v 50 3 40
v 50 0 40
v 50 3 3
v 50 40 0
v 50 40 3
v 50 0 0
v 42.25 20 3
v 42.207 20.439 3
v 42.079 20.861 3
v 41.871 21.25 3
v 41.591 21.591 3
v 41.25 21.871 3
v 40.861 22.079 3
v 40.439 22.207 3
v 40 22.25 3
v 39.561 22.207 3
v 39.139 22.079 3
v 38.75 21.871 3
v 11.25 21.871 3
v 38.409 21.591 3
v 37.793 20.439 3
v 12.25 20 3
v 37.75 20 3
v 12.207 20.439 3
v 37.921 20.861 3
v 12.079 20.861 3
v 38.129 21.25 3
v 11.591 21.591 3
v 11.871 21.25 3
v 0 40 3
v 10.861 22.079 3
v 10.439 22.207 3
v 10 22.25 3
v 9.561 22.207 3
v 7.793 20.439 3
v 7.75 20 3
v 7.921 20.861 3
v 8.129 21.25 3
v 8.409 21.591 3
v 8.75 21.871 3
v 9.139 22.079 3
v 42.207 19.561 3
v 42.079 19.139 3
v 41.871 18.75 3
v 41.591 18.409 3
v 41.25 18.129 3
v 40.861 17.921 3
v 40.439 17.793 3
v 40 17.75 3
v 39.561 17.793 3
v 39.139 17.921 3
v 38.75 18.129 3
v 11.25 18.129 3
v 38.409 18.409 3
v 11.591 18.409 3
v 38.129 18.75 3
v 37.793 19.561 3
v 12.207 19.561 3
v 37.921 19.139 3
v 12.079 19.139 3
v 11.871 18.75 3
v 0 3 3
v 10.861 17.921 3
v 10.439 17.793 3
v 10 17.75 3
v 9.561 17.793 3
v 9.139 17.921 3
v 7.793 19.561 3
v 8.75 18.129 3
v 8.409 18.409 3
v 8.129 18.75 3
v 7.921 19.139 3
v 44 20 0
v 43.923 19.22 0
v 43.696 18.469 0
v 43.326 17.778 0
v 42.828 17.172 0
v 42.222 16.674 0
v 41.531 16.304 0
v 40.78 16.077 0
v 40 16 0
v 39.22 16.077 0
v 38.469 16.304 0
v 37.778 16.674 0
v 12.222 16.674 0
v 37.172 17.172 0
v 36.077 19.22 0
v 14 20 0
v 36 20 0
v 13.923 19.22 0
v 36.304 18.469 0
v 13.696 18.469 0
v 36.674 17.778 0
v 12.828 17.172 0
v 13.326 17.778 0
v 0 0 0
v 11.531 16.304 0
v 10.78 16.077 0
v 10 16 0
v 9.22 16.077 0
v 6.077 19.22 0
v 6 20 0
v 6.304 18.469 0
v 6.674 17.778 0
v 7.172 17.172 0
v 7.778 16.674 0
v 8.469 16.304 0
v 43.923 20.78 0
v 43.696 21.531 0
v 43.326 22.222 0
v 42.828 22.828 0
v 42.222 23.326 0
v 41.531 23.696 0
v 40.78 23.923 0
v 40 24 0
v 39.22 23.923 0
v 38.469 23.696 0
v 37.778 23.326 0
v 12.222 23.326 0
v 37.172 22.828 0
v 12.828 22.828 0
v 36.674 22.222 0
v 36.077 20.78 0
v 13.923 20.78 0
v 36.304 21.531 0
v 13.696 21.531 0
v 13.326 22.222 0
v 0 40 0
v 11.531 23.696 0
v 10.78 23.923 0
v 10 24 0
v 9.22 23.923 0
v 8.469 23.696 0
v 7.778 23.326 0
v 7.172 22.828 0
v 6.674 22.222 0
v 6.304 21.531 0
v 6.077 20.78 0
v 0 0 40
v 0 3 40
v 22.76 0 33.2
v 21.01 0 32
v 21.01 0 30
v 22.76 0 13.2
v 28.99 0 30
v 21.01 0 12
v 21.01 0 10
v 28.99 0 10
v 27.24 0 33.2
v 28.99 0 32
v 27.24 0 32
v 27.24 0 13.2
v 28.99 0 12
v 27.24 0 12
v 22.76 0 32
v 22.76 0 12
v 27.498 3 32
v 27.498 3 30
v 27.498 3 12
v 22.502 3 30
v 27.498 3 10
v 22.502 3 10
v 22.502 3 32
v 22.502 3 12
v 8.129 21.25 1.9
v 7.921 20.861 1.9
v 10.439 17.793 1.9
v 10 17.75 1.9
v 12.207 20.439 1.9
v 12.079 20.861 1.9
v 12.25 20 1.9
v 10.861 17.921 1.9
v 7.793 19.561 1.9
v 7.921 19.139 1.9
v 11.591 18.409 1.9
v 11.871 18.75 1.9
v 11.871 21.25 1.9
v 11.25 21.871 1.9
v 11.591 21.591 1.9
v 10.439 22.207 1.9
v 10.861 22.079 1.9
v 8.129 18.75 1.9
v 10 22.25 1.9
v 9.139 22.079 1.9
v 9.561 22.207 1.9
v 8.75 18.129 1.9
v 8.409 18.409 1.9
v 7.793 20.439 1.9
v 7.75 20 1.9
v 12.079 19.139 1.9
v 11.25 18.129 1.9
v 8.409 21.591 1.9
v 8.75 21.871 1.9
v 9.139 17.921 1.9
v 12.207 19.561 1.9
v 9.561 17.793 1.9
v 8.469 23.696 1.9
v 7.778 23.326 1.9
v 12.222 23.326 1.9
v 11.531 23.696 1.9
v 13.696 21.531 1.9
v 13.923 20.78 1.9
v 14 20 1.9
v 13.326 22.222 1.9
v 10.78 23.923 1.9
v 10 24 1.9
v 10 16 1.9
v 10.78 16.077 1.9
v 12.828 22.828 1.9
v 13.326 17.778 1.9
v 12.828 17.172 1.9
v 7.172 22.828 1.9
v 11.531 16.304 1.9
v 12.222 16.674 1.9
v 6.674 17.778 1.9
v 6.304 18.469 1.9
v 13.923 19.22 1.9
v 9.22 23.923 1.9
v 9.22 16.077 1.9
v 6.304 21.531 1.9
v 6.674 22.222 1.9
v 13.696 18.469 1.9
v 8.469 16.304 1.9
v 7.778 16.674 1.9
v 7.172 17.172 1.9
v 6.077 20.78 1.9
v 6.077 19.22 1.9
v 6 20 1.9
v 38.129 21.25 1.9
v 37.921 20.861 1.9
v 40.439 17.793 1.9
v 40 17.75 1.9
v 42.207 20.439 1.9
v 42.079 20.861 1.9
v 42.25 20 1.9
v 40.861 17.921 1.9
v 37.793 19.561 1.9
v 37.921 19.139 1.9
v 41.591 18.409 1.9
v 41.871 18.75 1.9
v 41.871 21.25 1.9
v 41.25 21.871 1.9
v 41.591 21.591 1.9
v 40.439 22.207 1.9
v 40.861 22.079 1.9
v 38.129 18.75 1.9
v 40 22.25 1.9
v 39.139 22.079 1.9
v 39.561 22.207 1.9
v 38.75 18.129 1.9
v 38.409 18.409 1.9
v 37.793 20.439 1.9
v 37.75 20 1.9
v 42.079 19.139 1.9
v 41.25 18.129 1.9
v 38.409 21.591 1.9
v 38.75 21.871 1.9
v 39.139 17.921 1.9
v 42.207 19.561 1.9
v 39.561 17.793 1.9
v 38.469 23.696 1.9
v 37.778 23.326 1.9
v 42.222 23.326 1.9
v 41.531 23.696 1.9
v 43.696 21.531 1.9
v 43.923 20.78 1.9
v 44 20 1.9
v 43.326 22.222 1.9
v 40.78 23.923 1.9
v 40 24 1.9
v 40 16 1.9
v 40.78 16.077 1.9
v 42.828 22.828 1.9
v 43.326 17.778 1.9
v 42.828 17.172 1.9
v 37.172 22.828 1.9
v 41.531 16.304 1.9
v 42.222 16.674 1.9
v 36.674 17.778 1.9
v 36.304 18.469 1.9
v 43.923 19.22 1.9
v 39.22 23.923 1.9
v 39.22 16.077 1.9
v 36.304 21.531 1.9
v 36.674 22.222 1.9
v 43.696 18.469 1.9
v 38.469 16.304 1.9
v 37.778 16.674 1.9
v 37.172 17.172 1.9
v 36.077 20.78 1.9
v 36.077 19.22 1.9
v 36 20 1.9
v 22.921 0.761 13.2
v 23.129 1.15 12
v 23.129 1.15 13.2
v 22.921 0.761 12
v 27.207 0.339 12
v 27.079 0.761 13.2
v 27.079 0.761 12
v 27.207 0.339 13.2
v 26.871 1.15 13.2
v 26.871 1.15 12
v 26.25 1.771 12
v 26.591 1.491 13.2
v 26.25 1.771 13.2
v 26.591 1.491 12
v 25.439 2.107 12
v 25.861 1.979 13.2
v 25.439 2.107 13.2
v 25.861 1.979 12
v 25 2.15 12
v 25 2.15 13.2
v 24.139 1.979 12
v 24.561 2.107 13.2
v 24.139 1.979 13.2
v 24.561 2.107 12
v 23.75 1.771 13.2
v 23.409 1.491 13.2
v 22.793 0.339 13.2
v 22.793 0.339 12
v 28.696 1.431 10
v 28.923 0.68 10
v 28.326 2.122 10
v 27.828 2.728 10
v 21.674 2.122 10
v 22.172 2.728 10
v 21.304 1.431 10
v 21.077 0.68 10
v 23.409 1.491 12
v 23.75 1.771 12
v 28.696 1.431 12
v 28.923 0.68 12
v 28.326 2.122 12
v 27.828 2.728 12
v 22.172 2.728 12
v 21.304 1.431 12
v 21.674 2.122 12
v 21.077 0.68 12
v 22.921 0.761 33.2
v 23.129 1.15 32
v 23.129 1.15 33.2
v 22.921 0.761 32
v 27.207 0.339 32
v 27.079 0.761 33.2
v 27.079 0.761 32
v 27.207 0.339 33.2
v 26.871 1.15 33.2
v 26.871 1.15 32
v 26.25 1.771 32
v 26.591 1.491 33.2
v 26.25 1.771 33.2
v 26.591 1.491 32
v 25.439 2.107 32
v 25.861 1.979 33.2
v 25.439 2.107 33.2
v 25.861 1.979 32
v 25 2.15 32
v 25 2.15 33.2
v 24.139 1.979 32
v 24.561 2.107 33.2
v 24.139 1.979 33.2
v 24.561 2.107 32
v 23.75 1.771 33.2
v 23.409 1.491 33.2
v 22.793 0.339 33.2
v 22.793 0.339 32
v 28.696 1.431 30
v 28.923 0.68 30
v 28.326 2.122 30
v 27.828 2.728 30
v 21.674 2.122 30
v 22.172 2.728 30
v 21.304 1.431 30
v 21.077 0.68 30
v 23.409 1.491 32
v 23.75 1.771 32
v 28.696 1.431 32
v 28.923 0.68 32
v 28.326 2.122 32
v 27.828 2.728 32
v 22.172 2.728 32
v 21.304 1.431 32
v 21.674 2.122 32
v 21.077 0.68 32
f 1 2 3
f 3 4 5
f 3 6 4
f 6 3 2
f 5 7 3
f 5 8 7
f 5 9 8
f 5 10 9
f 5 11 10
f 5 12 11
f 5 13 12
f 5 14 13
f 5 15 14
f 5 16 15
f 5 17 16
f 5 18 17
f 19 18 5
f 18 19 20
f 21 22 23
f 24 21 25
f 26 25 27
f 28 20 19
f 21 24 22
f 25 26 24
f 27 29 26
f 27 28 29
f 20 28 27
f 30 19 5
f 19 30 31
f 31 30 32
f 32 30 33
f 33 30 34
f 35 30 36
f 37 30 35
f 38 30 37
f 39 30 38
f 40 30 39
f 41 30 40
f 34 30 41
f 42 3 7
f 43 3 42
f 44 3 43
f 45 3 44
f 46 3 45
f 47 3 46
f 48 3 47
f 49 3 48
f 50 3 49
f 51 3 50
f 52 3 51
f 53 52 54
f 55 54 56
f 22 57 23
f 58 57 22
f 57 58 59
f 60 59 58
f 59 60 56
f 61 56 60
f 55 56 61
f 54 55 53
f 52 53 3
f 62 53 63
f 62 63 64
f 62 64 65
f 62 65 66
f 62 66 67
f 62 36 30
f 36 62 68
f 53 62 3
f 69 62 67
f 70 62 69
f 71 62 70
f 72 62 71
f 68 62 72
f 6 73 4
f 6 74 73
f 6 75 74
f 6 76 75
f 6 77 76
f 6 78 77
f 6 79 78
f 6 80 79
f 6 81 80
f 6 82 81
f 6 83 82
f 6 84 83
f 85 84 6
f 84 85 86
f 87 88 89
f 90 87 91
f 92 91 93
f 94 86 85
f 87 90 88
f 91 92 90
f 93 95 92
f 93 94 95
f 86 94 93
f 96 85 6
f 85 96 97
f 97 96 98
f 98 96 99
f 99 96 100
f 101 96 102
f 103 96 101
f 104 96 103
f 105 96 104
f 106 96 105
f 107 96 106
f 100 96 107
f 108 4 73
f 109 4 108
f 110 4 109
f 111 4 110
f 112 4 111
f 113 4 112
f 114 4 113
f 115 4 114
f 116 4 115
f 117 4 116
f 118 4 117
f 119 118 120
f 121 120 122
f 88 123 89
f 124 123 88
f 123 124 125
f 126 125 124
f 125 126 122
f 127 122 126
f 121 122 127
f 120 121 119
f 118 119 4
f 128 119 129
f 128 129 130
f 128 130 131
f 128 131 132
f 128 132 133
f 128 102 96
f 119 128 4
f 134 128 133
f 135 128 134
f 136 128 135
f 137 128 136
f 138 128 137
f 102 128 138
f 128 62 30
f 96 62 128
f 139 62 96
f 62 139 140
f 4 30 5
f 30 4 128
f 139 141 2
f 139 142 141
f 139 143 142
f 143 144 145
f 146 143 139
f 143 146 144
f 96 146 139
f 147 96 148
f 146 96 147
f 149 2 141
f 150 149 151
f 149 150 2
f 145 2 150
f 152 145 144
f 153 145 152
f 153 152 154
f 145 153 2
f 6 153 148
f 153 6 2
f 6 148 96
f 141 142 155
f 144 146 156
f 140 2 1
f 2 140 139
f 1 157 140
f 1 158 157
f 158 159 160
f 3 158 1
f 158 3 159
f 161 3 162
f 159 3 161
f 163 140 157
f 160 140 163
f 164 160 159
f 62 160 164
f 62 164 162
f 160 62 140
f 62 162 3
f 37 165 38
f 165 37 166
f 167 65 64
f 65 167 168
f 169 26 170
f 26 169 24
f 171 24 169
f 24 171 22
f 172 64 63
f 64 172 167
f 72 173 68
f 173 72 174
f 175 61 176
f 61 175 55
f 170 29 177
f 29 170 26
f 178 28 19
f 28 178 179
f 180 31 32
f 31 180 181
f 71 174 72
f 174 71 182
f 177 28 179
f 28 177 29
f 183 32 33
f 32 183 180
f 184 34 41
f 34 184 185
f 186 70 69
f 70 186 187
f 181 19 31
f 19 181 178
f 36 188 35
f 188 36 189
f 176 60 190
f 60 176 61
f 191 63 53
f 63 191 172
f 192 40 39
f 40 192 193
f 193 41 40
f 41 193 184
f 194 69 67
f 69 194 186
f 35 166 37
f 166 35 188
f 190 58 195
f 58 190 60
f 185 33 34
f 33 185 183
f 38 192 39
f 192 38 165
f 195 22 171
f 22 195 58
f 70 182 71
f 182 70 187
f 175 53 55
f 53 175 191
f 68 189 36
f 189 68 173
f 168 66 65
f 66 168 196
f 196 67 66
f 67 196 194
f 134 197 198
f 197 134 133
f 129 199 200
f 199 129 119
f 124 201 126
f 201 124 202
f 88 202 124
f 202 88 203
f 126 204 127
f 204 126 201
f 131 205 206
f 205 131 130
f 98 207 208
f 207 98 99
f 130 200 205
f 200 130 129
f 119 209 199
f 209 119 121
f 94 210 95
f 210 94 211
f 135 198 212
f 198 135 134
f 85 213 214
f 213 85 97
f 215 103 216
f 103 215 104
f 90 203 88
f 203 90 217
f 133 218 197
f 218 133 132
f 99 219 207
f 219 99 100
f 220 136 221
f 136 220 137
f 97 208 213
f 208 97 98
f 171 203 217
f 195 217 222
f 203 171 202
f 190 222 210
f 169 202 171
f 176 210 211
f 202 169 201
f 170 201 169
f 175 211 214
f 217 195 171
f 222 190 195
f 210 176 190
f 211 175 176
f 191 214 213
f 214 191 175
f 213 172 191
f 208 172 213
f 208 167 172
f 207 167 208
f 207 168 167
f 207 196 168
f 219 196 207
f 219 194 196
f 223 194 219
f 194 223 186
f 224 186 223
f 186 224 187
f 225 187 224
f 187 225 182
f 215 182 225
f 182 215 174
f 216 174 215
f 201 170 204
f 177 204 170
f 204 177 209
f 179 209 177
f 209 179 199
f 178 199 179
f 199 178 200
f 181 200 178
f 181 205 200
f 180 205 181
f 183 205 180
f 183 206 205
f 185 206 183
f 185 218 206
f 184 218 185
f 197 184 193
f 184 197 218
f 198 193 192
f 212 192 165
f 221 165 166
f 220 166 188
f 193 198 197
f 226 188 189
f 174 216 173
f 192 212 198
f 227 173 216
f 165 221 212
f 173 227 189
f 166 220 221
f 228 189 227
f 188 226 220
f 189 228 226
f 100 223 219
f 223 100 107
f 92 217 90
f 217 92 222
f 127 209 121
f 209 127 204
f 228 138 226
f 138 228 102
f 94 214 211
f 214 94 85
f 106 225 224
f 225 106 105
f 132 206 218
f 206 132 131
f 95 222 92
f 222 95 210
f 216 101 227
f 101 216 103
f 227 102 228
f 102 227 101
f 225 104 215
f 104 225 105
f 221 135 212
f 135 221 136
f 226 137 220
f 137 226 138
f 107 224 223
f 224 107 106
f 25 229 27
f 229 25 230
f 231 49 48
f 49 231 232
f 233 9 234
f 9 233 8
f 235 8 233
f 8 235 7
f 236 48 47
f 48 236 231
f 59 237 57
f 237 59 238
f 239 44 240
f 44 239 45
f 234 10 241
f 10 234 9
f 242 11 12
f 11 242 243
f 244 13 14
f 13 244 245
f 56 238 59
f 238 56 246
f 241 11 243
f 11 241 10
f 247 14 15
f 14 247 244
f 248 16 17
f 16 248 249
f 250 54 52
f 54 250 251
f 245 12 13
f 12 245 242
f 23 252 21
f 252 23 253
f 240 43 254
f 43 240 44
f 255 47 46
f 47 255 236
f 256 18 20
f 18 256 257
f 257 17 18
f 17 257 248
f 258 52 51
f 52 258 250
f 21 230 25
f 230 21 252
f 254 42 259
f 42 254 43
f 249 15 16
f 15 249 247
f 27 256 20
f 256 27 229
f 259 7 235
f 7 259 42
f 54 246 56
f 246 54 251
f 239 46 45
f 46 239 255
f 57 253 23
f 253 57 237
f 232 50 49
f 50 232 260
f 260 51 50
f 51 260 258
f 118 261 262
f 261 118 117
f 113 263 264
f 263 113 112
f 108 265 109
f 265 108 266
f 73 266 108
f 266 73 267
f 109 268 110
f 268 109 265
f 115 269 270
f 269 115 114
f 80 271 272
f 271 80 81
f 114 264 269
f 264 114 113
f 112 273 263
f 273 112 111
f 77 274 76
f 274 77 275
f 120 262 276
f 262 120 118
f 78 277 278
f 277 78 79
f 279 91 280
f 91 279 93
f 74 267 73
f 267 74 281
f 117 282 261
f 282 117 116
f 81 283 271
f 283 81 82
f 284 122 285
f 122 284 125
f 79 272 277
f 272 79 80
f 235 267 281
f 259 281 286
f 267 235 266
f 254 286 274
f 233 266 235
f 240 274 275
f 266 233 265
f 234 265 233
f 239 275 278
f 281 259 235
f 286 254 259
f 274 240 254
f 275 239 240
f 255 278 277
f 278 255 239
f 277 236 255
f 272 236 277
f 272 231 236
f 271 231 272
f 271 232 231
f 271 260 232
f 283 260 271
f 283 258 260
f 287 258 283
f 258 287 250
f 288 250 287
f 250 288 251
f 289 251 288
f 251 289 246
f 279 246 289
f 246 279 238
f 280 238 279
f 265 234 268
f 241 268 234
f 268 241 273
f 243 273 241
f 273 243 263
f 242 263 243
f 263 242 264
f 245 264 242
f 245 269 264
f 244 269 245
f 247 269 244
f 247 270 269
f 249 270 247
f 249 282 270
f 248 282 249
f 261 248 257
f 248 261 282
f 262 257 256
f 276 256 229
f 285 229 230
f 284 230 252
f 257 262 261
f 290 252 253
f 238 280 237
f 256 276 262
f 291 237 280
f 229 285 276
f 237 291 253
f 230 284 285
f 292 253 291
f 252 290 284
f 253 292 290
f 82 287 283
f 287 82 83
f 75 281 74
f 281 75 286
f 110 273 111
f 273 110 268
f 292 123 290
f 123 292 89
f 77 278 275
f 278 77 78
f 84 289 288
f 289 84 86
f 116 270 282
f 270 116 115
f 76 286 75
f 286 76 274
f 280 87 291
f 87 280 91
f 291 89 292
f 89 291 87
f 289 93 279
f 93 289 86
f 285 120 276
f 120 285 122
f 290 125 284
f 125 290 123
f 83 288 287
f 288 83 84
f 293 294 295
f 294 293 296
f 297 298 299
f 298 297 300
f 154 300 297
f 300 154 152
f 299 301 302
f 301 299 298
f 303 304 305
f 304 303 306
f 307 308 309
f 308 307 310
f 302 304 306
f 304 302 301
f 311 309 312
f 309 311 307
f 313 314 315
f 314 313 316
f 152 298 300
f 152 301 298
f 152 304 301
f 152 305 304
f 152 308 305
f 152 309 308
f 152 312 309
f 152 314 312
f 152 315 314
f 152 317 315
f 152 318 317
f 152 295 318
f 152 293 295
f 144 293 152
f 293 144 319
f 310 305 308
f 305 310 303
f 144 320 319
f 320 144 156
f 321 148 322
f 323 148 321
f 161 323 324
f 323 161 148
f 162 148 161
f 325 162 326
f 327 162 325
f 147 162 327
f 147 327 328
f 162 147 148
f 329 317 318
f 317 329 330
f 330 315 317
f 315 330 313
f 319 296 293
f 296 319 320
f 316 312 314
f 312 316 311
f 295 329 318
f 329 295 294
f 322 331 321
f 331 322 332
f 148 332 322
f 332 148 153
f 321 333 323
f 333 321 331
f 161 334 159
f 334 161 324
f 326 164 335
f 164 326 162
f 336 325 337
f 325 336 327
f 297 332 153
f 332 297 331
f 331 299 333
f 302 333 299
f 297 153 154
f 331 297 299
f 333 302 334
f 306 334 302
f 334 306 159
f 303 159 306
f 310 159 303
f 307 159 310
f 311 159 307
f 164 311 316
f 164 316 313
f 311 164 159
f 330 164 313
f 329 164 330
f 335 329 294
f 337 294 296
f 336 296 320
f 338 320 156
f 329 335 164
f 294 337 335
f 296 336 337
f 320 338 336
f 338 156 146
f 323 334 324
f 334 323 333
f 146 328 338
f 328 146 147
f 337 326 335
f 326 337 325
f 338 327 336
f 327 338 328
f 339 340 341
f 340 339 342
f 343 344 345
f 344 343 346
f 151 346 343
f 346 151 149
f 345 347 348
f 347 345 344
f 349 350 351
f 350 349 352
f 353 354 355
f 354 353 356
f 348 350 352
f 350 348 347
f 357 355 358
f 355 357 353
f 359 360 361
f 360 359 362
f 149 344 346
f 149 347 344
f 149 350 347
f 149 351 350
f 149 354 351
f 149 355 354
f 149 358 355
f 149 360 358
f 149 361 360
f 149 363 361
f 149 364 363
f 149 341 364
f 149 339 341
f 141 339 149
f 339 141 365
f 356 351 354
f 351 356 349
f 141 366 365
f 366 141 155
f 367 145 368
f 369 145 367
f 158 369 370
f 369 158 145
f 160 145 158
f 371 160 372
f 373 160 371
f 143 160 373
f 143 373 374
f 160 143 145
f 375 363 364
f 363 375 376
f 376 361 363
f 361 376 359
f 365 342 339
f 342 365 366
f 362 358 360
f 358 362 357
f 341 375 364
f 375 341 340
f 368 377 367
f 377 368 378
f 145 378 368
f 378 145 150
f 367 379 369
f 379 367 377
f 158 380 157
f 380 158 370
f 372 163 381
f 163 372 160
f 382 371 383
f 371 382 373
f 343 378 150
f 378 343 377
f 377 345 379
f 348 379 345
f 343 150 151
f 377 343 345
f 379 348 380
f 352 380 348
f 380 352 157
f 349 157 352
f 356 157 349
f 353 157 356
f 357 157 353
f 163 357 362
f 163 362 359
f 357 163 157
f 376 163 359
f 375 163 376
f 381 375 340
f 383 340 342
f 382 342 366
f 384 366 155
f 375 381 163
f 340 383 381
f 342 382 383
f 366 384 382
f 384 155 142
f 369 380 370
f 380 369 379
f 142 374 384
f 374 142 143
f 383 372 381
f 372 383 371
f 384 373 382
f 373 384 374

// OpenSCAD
// L-bracket with countersunk holes

// Parameters
horizontal_width = 50;  // mm
horizontal_depth = 40;  // mm
vertical_width = 50;    // mm
vertical_height = 40;   // mm
thickness = 3;          // mm

// Hole parameters
hole_diameter = 4.5;    // mm
countersink_diameter = 8;  // mm
countersink_depth = 2;  // mm
hole_offset_from_edge = 10;  // mm from edge

// Countersunk hole
module countersunk_hole(depth = 50) {
    // Through hole
    cylinder(h = depth, r = hole_diameter / 2, center = false, $fn = 32);
    
    // Countersink
    cylinder(h = countersink_depth, r = countersink_diameter / 2, center = false, $fn = 32);
}

// Main L-bracket shape
module l_bracket() {
    // Horizontal flange (XY plane, at Z=0 to Z=thickness)
    cube([horizontal_width, horizontal_depth, thickness]);
    
    // Vertical flange (XZ plane, at Y=0 to Y=thickness)
    cube([vertical_width, thickness, vertical_height]);
}

// Holes for horizontal flange (top side, Z direction, countersink facing up)
module horizontal_flange_holes() {
    hole_y = horizontal_depth / 2;
    
    // Left hole
    hole_x_left = hole_offset_from_edge;
    translate([hole_x_left, hole_y, -0.1]) {
        countersunk_hole(thickness + 0.2);
    }
    
    // Right hole
    hole_x_right = horizontal_width - hole_offset_from_edge;
    translate([hole_x_right, hole_y, -0.1]) {
        countersunk_hole(thickness + 0.2);
    }
}

// Holes for vertical flange (front side, Y direction, countersink facing outward -Y)
module vertical_flange_holes() {
    hole_x = vertical_width / 2;
    
    // Bottom hole
    hole_z_bottom = hole_offset_from_edge;
    translate([hole_x, -0.1, hole_z_bottom]) {
        countersunk_hole(thickness + 0.2);
    }
    
    // Top hole
    hole_z_top = vertical_height - hole_offset_from_edge;
    translate([hole_x, -0.1, hole_z_top]) {
        countersunk_hole(thickness + 0.2);
    }
}

// Main assembly
difference() {
    l_bracket();
    horizontal_flange_holes();
    vertical_flange_holes();
}
